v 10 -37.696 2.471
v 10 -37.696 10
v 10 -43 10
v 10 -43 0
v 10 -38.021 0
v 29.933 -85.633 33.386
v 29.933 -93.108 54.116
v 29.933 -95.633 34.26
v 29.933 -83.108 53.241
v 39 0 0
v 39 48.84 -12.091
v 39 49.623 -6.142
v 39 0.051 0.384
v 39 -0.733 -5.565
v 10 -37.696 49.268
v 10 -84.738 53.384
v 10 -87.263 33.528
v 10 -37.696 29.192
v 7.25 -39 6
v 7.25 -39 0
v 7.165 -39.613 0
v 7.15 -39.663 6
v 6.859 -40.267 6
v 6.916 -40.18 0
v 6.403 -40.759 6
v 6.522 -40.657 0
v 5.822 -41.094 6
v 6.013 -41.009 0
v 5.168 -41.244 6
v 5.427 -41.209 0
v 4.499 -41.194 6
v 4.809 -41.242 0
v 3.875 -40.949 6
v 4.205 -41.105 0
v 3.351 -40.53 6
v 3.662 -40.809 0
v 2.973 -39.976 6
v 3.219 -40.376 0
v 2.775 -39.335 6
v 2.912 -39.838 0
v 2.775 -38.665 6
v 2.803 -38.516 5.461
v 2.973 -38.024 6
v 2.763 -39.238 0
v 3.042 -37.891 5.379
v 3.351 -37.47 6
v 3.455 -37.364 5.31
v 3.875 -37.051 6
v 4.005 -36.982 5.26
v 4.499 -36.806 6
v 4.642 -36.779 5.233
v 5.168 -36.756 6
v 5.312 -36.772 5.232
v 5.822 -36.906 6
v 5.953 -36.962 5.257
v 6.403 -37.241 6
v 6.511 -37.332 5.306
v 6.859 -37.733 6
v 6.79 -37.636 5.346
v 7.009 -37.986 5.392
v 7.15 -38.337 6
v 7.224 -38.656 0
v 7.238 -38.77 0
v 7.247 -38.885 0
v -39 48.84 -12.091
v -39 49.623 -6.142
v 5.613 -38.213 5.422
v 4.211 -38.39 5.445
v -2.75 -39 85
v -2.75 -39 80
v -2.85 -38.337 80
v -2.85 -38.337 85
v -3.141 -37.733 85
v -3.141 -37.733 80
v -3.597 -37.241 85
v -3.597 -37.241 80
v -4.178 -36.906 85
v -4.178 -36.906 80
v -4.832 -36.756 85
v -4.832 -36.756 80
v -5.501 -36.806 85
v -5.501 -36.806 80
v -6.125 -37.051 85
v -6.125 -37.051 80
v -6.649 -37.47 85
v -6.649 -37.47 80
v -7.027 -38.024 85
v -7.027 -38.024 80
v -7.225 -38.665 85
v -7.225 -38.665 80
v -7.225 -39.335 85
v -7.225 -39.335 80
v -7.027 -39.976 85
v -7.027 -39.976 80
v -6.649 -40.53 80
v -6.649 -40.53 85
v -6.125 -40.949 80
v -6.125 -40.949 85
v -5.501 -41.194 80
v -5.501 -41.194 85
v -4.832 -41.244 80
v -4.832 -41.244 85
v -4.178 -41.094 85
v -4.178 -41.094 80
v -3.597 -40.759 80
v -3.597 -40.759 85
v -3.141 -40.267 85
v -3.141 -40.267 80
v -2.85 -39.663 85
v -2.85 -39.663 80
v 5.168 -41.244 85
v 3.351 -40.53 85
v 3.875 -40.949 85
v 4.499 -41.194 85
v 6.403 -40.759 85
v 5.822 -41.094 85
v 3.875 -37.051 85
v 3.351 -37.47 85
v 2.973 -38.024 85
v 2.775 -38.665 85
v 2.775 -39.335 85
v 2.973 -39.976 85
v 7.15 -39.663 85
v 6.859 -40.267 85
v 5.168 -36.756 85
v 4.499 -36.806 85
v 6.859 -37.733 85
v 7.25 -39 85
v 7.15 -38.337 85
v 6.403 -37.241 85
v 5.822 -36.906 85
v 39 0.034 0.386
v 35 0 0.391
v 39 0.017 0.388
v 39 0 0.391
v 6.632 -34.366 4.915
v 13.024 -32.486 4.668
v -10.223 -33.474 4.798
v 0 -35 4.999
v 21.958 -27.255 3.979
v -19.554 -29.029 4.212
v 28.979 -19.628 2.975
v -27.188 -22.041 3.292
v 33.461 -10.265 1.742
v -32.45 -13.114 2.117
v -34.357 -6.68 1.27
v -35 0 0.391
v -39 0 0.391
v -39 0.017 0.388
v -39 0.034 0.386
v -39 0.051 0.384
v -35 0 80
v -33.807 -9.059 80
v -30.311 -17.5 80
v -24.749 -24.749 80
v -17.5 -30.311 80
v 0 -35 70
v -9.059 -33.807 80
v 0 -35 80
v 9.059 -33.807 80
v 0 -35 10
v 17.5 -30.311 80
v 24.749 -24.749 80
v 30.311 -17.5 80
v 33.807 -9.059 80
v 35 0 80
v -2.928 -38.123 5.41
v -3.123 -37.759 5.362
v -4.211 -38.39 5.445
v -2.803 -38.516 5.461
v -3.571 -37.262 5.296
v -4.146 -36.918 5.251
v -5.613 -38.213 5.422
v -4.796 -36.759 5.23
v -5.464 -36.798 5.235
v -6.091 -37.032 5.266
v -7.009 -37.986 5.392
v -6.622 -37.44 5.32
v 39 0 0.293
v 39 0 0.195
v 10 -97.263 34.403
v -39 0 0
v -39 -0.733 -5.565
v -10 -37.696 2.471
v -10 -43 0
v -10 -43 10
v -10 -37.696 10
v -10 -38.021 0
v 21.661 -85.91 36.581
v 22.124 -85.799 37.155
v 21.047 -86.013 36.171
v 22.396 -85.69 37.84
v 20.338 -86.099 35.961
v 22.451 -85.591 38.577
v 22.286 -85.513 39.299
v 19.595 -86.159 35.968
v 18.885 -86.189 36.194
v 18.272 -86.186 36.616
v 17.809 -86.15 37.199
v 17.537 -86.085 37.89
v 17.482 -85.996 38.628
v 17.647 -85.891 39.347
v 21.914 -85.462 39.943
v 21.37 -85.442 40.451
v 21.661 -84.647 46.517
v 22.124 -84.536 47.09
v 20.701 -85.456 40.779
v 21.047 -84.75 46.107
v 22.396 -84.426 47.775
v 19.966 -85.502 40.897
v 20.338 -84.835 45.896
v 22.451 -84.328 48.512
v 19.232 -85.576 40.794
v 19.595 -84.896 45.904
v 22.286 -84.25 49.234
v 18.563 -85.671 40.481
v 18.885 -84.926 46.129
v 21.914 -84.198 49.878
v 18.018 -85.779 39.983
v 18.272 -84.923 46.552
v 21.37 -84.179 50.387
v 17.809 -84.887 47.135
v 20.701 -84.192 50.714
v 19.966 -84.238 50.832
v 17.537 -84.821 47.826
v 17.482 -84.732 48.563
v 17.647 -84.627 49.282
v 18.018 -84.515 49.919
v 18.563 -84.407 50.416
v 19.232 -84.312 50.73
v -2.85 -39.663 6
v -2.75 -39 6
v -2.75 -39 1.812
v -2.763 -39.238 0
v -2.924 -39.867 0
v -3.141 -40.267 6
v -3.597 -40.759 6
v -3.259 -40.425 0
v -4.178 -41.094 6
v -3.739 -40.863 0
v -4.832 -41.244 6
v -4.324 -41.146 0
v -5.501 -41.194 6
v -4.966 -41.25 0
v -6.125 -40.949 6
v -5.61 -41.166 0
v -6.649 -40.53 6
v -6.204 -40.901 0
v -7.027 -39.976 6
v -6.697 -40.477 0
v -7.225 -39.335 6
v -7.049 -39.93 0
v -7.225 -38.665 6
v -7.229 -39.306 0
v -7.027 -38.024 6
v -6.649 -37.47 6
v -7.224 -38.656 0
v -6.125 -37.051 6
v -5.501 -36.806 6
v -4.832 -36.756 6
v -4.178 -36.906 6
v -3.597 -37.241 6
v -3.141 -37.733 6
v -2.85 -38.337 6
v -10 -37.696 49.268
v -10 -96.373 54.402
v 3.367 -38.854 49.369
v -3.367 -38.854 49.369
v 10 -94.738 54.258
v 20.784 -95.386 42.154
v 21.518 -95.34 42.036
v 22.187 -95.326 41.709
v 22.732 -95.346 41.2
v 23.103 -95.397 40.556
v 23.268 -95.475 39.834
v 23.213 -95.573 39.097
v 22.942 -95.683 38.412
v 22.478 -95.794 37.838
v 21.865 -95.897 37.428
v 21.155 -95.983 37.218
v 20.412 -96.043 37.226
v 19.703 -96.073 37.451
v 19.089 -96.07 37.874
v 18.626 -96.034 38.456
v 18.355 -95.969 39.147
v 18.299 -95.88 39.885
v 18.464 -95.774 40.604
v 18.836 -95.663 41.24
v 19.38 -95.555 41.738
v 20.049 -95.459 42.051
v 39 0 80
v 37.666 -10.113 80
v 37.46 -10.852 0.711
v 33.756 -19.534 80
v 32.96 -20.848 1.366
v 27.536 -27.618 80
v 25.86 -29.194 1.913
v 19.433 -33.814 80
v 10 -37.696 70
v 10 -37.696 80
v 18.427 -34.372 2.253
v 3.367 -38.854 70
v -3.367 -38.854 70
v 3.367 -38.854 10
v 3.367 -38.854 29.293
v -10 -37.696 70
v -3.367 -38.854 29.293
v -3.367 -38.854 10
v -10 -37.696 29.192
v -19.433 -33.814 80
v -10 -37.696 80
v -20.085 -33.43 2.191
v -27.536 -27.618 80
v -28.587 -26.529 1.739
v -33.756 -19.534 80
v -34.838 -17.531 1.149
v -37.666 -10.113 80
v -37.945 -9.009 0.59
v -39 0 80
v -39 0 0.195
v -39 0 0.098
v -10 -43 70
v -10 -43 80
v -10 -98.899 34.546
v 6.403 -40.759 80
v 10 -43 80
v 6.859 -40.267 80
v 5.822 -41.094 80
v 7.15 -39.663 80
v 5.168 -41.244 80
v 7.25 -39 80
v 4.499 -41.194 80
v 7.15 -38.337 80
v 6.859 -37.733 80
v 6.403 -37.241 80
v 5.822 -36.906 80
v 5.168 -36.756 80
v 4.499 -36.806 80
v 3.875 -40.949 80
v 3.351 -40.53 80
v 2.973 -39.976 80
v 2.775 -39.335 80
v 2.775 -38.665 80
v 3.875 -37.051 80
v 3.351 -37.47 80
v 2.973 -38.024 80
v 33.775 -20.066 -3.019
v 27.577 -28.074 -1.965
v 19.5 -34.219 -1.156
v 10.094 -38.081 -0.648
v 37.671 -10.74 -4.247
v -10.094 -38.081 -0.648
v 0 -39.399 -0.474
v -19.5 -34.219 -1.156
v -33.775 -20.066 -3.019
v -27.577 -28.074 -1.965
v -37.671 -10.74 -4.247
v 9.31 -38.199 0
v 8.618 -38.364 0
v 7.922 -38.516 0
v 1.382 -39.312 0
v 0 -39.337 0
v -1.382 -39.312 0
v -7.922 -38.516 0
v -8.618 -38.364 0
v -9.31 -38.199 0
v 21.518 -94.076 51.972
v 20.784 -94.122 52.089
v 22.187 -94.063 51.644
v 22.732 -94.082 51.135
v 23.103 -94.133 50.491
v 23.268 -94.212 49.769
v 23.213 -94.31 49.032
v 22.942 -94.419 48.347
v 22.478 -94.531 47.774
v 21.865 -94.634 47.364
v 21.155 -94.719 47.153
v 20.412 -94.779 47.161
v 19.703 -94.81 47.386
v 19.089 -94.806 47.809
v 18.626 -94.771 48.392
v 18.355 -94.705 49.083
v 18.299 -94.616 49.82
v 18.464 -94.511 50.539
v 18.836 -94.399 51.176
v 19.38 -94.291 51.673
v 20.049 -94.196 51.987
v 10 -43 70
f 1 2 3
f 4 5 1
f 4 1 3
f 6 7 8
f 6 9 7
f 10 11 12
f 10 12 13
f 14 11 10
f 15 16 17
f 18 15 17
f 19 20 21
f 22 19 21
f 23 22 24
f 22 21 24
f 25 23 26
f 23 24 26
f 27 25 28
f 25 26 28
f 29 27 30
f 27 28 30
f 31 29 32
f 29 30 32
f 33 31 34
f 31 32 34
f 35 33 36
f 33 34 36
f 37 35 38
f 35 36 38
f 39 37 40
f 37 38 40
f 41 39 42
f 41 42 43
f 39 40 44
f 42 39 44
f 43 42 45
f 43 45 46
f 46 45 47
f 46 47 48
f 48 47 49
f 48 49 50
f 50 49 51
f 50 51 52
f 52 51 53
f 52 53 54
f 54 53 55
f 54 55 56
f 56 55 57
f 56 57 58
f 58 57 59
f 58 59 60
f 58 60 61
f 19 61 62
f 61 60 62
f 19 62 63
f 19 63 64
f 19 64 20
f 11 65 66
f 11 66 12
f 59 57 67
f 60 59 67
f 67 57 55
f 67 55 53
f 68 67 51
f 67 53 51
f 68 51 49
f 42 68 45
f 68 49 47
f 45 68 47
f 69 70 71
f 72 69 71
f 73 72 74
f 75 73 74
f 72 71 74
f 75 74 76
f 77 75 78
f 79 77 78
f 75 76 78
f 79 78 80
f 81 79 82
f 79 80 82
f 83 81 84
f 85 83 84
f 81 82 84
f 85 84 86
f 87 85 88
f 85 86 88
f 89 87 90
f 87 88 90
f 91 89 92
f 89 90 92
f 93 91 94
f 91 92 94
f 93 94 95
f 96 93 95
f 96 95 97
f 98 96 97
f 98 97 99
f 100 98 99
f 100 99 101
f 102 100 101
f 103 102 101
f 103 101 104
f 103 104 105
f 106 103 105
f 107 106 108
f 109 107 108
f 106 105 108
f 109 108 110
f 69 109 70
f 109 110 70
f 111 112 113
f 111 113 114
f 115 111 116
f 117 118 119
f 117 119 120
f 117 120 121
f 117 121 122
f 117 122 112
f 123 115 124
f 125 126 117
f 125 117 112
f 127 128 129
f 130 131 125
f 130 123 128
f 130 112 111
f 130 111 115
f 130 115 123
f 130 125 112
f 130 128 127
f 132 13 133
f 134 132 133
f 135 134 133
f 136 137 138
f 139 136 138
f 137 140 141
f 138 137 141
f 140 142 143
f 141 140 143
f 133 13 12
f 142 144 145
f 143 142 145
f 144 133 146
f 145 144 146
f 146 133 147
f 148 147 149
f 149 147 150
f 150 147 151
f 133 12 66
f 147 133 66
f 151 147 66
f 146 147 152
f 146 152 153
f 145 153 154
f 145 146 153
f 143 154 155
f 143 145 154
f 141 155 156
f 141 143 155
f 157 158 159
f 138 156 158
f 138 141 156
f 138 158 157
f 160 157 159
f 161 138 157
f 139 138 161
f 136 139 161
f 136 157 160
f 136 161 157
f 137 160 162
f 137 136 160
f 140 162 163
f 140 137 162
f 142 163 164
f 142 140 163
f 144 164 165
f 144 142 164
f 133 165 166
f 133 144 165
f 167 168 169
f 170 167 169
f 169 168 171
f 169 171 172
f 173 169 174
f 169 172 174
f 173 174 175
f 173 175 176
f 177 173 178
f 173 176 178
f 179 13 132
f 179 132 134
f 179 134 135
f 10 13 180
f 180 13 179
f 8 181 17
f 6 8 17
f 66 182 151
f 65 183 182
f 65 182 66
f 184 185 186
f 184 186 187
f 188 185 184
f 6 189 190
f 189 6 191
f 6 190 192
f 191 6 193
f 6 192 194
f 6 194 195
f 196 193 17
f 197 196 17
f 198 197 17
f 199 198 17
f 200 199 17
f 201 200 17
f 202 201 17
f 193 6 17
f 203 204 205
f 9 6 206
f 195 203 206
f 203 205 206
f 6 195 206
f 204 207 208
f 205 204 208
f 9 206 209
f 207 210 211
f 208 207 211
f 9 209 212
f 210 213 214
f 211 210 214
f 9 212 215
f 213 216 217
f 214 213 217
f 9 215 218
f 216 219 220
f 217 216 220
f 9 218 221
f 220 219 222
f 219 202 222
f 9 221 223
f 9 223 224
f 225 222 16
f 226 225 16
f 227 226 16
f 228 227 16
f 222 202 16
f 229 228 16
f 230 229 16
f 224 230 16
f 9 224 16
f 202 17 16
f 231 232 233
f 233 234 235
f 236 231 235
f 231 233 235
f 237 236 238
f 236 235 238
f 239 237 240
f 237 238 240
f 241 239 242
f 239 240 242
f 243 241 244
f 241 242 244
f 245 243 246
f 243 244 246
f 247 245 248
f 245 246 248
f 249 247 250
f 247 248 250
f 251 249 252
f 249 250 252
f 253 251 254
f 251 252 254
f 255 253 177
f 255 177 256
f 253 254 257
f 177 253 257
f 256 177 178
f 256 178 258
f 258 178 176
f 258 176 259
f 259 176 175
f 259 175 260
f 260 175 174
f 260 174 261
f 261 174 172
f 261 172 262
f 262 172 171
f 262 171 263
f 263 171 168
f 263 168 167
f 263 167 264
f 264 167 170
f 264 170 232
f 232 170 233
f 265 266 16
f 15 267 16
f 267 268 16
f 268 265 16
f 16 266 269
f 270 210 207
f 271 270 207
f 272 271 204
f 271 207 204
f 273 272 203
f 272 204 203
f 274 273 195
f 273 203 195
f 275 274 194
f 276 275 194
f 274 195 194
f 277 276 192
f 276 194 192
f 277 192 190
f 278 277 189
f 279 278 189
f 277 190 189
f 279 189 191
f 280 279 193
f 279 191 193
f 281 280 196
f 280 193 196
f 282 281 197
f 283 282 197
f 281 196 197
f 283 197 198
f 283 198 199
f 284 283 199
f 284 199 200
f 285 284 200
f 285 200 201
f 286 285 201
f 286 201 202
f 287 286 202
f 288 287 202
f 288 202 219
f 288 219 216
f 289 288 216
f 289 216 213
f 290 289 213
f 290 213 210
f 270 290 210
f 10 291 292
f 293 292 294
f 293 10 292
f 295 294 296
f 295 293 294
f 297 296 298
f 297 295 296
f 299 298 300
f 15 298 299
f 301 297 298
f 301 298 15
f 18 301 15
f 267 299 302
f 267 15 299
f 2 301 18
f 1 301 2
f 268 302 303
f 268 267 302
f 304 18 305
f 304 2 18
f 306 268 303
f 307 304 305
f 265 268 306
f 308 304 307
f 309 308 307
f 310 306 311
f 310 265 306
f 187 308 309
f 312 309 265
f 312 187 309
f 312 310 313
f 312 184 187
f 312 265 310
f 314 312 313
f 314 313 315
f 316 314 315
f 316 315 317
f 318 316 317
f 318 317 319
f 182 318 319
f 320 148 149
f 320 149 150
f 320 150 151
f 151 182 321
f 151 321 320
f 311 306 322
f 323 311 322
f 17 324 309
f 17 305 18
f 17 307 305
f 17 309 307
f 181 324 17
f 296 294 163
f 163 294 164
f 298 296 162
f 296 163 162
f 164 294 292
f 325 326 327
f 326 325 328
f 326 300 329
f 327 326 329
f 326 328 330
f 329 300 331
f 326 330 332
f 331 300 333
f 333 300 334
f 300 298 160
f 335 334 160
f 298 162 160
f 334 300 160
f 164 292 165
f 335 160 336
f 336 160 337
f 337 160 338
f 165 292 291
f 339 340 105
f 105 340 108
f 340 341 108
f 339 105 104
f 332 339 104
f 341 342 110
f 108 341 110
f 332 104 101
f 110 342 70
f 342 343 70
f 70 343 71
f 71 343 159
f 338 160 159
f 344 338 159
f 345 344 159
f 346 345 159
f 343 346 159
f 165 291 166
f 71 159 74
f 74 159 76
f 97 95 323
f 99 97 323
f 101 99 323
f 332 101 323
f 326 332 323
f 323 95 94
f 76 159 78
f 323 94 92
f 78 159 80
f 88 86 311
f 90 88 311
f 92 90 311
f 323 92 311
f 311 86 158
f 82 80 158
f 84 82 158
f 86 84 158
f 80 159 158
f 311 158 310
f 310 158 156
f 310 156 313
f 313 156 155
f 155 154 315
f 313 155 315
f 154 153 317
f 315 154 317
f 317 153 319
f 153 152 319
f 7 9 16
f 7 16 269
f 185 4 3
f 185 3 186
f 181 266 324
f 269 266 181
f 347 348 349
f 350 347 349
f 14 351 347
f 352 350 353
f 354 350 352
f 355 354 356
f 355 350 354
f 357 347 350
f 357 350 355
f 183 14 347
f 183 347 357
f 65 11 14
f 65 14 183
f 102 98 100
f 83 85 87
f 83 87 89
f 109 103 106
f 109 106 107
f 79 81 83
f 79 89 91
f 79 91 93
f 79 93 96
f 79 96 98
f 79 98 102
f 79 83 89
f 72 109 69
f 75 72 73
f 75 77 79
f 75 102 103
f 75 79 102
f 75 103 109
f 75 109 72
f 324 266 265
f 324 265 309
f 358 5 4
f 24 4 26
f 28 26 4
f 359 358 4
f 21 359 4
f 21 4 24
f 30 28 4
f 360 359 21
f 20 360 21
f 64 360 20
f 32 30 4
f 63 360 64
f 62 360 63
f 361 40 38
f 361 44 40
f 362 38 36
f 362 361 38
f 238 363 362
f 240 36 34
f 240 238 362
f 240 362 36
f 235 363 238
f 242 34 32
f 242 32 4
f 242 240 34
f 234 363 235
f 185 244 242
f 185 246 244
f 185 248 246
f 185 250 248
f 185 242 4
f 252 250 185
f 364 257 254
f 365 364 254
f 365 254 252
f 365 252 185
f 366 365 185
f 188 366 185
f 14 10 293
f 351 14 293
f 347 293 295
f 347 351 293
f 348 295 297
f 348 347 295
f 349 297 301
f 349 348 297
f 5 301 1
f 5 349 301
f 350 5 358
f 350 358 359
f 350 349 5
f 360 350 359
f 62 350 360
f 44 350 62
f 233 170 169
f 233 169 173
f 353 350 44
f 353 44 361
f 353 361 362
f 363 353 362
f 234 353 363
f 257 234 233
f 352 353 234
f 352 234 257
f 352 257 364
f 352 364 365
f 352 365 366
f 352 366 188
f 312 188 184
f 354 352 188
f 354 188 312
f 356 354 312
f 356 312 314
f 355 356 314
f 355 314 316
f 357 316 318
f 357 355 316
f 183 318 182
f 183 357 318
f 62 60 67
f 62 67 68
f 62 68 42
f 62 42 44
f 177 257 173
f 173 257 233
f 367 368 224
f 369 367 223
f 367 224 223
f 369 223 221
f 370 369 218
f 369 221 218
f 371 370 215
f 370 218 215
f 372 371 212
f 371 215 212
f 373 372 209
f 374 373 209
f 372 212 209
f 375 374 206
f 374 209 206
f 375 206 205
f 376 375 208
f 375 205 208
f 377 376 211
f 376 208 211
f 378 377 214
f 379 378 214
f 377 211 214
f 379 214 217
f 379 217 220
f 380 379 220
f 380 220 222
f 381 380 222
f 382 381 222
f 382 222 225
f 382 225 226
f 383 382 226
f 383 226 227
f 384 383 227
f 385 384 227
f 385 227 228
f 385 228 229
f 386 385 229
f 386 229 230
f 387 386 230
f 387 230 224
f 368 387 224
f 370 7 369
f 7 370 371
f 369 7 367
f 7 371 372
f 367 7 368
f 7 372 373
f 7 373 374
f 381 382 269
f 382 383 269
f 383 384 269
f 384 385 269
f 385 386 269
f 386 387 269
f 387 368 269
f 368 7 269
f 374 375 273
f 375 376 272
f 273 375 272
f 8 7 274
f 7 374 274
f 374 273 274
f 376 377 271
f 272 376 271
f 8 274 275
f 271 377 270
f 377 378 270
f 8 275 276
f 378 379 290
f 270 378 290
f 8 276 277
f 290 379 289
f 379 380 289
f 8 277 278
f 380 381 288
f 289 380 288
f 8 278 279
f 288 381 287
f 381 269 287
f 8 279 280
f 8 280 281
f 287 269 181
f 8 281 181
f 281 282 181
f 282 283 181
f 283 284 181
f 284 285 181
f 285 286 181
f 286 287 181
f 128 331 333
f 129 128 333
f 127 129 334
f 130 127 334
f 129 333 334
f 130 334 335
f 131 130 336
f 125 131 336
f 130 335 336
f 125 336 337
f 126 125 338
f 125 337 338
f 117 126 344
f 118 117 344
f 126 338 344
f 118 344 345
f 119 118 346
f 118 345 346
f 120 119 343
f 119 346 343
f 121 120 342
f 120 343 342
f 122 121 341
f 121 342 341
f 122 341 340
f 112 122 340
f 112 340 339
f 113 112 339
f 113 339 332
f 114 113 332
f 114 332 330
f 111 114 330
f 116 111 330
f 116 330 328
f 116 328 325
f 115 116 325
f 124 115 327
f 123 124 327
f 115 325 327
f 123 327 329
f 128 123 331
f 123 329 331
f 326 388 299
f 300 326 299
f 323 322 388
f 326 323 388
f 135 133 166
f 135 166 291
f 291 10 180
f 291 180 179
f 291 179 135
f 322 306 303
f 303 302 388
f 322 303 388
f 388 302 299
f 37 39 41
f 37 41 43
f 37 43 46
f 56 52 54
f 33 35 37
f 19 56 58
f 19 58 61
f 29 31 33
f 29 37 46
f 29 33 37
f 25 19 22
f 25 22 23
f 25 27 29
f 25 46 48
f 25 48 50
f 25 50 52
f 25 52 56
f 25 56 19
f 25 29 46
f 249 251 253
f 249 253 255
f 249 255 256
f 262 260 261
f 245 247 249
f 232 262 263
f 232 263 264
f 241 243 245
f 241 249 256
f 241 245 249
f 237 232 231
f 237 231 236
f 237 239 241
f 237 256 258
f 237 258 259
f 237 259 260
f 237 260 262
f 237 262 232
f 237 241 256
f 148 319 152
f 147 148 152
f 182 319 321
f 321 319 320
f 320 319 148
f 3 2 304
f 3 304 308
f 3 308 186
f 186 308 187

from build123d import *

# Parameters (mm, degrees)
EXTRUDE_THIN1_DEPTH       = 80
BOSS_EXTRUDE1_START       = -10
BOSS_EXTRUDE1_DEPTH       = 10
SKETCH3_R                 = 2.25
BOSS_EXTRUDE2_DEPTH       = 5
BOSS_EXTRUDE3_DEPTH       = 10
SKETCH5_R                 = 2.25
CUT_EXTRUDE1_DEPTH        = 6
BOSS_EXTRUDE4_REACH       = 104.415
BOSS_EXTRUDE4_END_RADIUS  = 39
SKETCH10_W                = 20
SKETCH10_H                = 20
BOSS_EXTRUDE6_DEPTH       = 6
BOSS_EXTRUDE7_START       = -51.724499634
BOSS_EXTRUDE7_OUTLINE_W   = 20
BOSS_EXTRUDE7_OUTLINE_H   = 20
BOSS_EXTRUDE7_DEPTH       = 51.724499634
BOSS_EXTRUDE7_START_2     = 101.306507824
BOSS_EXTRUDE7_2_OUTLINE_W = 23
BOSS_EXTRUDE7_2_OUTLINE_H = 23
BOSS_EXTRUDE7_2_DEPTH     = 3.693492176
BOSS_EXTRUDE9_DEPTH       = 20
SKETCH16_R                = 2.5
CUT_EXTRUDE2_DEPTH        = 20


with BuildPart() as part:
    # Sketch1 → Extrude-Thin1 (new body)
    with BuildSketch(Plane.XY):
        with BuildLine():
            ThreePointArc((-35, 0), (0, -35), (35, 0))
            Line((35, 0), (39, 0))
            ThreePointArc((39, 0), (0, -39), (-39, 0))
            Line((-39, 0), (-35, 0))
        make_face()
    extrude(amount=EXTRUDE_THIN1_DEPTH)

    # Sketch2 → Boss-Extrude1 (add)
    with BuildSketch(Plane.XY.offset(80).offset(BOSS_EXTRUDE1_START)):
        with BuildLine():
            Line((0, -39), (0, -35))
            Line((0, -35), (-10, -35))
            Line((-10, -35), (-10, -37.69615365))
            ThreePointArc((-10, -37.69615365), (-5.042321274, -38.672664715), (0, -39))
        make_face()
        with BuildLine():
            Line((10, -35), (0, -35))
            Line((0, -35), (0, -39))
            ThreePointArc((0, -39), (5.042321274, -38.672664715), (10, -37.69615365))
            Line((10, -37.69615365), (10, -35))
        make_face()
        with BuildLine():
            ThreePointArc((10, -37.69615365), (5.042321274, -38.672664715), (0, -39))
            ThreePointArc((0, -39), (-5.042321274, -38.672664715), (-10, -37.69615365))
            Line((-10, -37.69615365), (-10, -43))
            Line((-10, -43), (10, -43))
            Line((10, -43), (10, -37.69615365))
        make_face()
    extrude(amount=BOSS_EXTRUDE1_DEPTH)

    # Sketch3 → Boss-Extrude2 (add)
    with BuildSketch(Plane.XY.offset(80)):
        with Locations((-5, -39)):
            Circle(SKETCH3_R)
        with Locations((5, -39)):
            Circle(SKETCH3_R)
    extrude(amount=BOSS_EXTRUDE2_DEPTH)

    # Sketch4 → Boss-Extrude3 (add)
    with BuildSketch(Plane(origin=(0, 0, 0), x_dir=(-1, 0, 0), z_dir=(0, 0, -1))):
        with BuildLine():
            Line((0, -39), (0, -35))
            Line((0, -35), (-10, -35))
            Line((-10, -35), (-10, -37.69615365))
            ThreePointArc((-10, -37.69615365), (-5.042321274, -38.672664715), (0, -39))
        make_face()
        with BuildLine():
            ThreePointArc((10, -37.69615365), (5.042321274, -38.672664715), (0, -39))
            ThreePointArc((0, -39), (-5.042321274, -38.672664715), (-10, -37.69615365))
            Line((-10, -37.69615365), (-10, -43))
            Line((-10, -43), (10, -43))
            Line((10, -43), (10, -37.69615365))
        make_face()
        with BuildLine():
            Line((10, -35), (0, -35))
            Line((0, -35), (0, -39))
            ThreePointArc((0, -39), (5.042321274, -38.672664715), (10, -37.69615365))
            Line((10, -37.69615365), (10, -35))
        make_face()
    extrude(amount=-BOSS_EXTRUDE3_DEPTH)

    # Sketch5 → Cut-Extrude1 (cut)
    with BuildSketch(Plane(origin=(0, 0, 0), x_dir=(-1, 0, 0), z_dir=(0, 0, -1))):
        with Locations(Location((-5, -39, 0), (0, 0, 180))):
            Circle(SKETCH5_R)
        with Locations(Location((5, -39, 0), (0, 0, 180))):
            Circle(SKETCH5_R)
    extrude(amount=-CUT_EXTRUDE1_DEPTH, mode=Mode.SUBTRACT)

    # Boss-Extrude4: up to this cylinder (the profile starts outside it)
    boss_extrude4_end = Plane(origin=(0, 0, 40), z_dir=(0, 0, -1)) * Cylinder(BOSS_EXTRUDE4_END_RADIUS, 287.83, mode=Mode.PRIVATE)
    # Sketch10 → Boss-Extrude4 (add, up to the surface)
    with BuildSketch(Plane(origin=(0, -49.619293796, 4.341125699), x_dir=(1, 0, 0), z_dir=(0, 0.9961946980917462, -0.08715574274765152)), mode=Mode.PRIVATE) as boss_extrude4_sk1:
        with Locations((0, -35.795085407)):
            Rectangle(SKETCH10_W, SKETCH10_H)
    boss_extrude4_tool1 = extrude(boss_extrude4_sk1.sketch, amount=BOSS_EXTRUDE4_REACH, mode=Mode.PRIVATE) - boss_extrude4_end
    add(boss_extrude4_tool1.solids().sort_by_distance((0, -46.499547, 40))[0])

    # Sketch14 → Boss-Extrude6 (add)
    with BuildSketch(Plane(origin=(0, -0.732594735, -5.56460947), x_dir=(1, 0, 0), z_dir=(0, 0.130526192220045, 0.9914448613738114))):
        with BuildLine():
            Line((-39, 0), (-39, 50))
            Line((-39, 50), (39, 50))
            Line((39, 50), (39, 0))
            ThreePointArc((39, 0), (0, -39), (-39, 0))
        make_face()
    extrude(amount=BOSS_EXTRUDE6_DEPTH)

    # Boss-Extrude7: read off the stored shape, not the designer's step
    # Boss-Extrude7 outline → Boss-Extrude7 (add)
    with BuildSketch(Plane(origin=(0, -49.619293796, 4.341125699), x_dir=(1, 0, 0), z_dir=(0, 0.9961946980917462, -0.08715574274765152)).offset(BOSS_EXTRUDE7_START)):
        with Locations((0, -35.795085407)):
            Rectangle(BOSS_EXTRUDE7_OUTLINE_W, BOSS_EXTRUDE7_OUTLINE_H)
    extrude(amount=BOSS_EXTRUDE7_DEPTH)

    # Boss-Extrude7 2 outline → Boss-Extrude7 2 (cut)
    with BuildSketch(Plane(origin=(0, 0, 0), x_dir=(0.9966522374056315, 0.08110432407614718, -0.010315342480997143), z_dir=(0.08175767654690885, -0.9886876617314986, 0.1257473254807149)).offset(BOSS_EXTRUDE7_START_2)):
        with Locations((-8.5, 31.5)):
            Rectangle(BOSS_EXTRUDE7_2_OUTLINE_W, BOSS_EXTRUDE7_2_OUTLINE_H)
    extrude(amount=BOSS_EXTRUDE7_2_DEPTH, mode=Mode.SUBTRACT)

    # Sketch15 → Boss-Extrude9 (add, along a direction that is not the sketch's normal)
    with BuildSketch(Plane(origin=(10, 0, 0), x_dir=(0, 0, -1), z_dir=(1, 0, 0))):
        Polygon((-54.258496601, -94.737775996), (-34.403038319, -97.263114251), (-33.528151684, -87.263114251), (-53.383609966, -84.737775996), align=None)
    extrude(amount=BOSS_EXTRUDE9_DEPTH, dir=(0.9966471031139099, 0.08150889038643343, -0.007131103885357661))

    # Sketch16 → Cut-Extrude2 (cut)
    with BuildSketch(Plane(origin=(7.465262096, -90.276691283, 11.481940072), x_dir=(0.9966522374056315, 0.08110432407614722, -0.010315342480997126), z_dir=(-0.0817576765469089, 0.9886876617314987, -0.12574732548071466))):
        with Locations(Location((12.543149078, -37.29773566, 0), (0, 0, 270))):
            Circle(SKETCH16_R)
        with Locations(Location((12.543149078, -27.282379188, 0), (0, 0, 270))):
            Circle(SKETCH16_R)
    extrude(amount=-CUT_EXTRUDE2_DEPTH, mode=Mode.SUBTRACT)


solid = part.part
